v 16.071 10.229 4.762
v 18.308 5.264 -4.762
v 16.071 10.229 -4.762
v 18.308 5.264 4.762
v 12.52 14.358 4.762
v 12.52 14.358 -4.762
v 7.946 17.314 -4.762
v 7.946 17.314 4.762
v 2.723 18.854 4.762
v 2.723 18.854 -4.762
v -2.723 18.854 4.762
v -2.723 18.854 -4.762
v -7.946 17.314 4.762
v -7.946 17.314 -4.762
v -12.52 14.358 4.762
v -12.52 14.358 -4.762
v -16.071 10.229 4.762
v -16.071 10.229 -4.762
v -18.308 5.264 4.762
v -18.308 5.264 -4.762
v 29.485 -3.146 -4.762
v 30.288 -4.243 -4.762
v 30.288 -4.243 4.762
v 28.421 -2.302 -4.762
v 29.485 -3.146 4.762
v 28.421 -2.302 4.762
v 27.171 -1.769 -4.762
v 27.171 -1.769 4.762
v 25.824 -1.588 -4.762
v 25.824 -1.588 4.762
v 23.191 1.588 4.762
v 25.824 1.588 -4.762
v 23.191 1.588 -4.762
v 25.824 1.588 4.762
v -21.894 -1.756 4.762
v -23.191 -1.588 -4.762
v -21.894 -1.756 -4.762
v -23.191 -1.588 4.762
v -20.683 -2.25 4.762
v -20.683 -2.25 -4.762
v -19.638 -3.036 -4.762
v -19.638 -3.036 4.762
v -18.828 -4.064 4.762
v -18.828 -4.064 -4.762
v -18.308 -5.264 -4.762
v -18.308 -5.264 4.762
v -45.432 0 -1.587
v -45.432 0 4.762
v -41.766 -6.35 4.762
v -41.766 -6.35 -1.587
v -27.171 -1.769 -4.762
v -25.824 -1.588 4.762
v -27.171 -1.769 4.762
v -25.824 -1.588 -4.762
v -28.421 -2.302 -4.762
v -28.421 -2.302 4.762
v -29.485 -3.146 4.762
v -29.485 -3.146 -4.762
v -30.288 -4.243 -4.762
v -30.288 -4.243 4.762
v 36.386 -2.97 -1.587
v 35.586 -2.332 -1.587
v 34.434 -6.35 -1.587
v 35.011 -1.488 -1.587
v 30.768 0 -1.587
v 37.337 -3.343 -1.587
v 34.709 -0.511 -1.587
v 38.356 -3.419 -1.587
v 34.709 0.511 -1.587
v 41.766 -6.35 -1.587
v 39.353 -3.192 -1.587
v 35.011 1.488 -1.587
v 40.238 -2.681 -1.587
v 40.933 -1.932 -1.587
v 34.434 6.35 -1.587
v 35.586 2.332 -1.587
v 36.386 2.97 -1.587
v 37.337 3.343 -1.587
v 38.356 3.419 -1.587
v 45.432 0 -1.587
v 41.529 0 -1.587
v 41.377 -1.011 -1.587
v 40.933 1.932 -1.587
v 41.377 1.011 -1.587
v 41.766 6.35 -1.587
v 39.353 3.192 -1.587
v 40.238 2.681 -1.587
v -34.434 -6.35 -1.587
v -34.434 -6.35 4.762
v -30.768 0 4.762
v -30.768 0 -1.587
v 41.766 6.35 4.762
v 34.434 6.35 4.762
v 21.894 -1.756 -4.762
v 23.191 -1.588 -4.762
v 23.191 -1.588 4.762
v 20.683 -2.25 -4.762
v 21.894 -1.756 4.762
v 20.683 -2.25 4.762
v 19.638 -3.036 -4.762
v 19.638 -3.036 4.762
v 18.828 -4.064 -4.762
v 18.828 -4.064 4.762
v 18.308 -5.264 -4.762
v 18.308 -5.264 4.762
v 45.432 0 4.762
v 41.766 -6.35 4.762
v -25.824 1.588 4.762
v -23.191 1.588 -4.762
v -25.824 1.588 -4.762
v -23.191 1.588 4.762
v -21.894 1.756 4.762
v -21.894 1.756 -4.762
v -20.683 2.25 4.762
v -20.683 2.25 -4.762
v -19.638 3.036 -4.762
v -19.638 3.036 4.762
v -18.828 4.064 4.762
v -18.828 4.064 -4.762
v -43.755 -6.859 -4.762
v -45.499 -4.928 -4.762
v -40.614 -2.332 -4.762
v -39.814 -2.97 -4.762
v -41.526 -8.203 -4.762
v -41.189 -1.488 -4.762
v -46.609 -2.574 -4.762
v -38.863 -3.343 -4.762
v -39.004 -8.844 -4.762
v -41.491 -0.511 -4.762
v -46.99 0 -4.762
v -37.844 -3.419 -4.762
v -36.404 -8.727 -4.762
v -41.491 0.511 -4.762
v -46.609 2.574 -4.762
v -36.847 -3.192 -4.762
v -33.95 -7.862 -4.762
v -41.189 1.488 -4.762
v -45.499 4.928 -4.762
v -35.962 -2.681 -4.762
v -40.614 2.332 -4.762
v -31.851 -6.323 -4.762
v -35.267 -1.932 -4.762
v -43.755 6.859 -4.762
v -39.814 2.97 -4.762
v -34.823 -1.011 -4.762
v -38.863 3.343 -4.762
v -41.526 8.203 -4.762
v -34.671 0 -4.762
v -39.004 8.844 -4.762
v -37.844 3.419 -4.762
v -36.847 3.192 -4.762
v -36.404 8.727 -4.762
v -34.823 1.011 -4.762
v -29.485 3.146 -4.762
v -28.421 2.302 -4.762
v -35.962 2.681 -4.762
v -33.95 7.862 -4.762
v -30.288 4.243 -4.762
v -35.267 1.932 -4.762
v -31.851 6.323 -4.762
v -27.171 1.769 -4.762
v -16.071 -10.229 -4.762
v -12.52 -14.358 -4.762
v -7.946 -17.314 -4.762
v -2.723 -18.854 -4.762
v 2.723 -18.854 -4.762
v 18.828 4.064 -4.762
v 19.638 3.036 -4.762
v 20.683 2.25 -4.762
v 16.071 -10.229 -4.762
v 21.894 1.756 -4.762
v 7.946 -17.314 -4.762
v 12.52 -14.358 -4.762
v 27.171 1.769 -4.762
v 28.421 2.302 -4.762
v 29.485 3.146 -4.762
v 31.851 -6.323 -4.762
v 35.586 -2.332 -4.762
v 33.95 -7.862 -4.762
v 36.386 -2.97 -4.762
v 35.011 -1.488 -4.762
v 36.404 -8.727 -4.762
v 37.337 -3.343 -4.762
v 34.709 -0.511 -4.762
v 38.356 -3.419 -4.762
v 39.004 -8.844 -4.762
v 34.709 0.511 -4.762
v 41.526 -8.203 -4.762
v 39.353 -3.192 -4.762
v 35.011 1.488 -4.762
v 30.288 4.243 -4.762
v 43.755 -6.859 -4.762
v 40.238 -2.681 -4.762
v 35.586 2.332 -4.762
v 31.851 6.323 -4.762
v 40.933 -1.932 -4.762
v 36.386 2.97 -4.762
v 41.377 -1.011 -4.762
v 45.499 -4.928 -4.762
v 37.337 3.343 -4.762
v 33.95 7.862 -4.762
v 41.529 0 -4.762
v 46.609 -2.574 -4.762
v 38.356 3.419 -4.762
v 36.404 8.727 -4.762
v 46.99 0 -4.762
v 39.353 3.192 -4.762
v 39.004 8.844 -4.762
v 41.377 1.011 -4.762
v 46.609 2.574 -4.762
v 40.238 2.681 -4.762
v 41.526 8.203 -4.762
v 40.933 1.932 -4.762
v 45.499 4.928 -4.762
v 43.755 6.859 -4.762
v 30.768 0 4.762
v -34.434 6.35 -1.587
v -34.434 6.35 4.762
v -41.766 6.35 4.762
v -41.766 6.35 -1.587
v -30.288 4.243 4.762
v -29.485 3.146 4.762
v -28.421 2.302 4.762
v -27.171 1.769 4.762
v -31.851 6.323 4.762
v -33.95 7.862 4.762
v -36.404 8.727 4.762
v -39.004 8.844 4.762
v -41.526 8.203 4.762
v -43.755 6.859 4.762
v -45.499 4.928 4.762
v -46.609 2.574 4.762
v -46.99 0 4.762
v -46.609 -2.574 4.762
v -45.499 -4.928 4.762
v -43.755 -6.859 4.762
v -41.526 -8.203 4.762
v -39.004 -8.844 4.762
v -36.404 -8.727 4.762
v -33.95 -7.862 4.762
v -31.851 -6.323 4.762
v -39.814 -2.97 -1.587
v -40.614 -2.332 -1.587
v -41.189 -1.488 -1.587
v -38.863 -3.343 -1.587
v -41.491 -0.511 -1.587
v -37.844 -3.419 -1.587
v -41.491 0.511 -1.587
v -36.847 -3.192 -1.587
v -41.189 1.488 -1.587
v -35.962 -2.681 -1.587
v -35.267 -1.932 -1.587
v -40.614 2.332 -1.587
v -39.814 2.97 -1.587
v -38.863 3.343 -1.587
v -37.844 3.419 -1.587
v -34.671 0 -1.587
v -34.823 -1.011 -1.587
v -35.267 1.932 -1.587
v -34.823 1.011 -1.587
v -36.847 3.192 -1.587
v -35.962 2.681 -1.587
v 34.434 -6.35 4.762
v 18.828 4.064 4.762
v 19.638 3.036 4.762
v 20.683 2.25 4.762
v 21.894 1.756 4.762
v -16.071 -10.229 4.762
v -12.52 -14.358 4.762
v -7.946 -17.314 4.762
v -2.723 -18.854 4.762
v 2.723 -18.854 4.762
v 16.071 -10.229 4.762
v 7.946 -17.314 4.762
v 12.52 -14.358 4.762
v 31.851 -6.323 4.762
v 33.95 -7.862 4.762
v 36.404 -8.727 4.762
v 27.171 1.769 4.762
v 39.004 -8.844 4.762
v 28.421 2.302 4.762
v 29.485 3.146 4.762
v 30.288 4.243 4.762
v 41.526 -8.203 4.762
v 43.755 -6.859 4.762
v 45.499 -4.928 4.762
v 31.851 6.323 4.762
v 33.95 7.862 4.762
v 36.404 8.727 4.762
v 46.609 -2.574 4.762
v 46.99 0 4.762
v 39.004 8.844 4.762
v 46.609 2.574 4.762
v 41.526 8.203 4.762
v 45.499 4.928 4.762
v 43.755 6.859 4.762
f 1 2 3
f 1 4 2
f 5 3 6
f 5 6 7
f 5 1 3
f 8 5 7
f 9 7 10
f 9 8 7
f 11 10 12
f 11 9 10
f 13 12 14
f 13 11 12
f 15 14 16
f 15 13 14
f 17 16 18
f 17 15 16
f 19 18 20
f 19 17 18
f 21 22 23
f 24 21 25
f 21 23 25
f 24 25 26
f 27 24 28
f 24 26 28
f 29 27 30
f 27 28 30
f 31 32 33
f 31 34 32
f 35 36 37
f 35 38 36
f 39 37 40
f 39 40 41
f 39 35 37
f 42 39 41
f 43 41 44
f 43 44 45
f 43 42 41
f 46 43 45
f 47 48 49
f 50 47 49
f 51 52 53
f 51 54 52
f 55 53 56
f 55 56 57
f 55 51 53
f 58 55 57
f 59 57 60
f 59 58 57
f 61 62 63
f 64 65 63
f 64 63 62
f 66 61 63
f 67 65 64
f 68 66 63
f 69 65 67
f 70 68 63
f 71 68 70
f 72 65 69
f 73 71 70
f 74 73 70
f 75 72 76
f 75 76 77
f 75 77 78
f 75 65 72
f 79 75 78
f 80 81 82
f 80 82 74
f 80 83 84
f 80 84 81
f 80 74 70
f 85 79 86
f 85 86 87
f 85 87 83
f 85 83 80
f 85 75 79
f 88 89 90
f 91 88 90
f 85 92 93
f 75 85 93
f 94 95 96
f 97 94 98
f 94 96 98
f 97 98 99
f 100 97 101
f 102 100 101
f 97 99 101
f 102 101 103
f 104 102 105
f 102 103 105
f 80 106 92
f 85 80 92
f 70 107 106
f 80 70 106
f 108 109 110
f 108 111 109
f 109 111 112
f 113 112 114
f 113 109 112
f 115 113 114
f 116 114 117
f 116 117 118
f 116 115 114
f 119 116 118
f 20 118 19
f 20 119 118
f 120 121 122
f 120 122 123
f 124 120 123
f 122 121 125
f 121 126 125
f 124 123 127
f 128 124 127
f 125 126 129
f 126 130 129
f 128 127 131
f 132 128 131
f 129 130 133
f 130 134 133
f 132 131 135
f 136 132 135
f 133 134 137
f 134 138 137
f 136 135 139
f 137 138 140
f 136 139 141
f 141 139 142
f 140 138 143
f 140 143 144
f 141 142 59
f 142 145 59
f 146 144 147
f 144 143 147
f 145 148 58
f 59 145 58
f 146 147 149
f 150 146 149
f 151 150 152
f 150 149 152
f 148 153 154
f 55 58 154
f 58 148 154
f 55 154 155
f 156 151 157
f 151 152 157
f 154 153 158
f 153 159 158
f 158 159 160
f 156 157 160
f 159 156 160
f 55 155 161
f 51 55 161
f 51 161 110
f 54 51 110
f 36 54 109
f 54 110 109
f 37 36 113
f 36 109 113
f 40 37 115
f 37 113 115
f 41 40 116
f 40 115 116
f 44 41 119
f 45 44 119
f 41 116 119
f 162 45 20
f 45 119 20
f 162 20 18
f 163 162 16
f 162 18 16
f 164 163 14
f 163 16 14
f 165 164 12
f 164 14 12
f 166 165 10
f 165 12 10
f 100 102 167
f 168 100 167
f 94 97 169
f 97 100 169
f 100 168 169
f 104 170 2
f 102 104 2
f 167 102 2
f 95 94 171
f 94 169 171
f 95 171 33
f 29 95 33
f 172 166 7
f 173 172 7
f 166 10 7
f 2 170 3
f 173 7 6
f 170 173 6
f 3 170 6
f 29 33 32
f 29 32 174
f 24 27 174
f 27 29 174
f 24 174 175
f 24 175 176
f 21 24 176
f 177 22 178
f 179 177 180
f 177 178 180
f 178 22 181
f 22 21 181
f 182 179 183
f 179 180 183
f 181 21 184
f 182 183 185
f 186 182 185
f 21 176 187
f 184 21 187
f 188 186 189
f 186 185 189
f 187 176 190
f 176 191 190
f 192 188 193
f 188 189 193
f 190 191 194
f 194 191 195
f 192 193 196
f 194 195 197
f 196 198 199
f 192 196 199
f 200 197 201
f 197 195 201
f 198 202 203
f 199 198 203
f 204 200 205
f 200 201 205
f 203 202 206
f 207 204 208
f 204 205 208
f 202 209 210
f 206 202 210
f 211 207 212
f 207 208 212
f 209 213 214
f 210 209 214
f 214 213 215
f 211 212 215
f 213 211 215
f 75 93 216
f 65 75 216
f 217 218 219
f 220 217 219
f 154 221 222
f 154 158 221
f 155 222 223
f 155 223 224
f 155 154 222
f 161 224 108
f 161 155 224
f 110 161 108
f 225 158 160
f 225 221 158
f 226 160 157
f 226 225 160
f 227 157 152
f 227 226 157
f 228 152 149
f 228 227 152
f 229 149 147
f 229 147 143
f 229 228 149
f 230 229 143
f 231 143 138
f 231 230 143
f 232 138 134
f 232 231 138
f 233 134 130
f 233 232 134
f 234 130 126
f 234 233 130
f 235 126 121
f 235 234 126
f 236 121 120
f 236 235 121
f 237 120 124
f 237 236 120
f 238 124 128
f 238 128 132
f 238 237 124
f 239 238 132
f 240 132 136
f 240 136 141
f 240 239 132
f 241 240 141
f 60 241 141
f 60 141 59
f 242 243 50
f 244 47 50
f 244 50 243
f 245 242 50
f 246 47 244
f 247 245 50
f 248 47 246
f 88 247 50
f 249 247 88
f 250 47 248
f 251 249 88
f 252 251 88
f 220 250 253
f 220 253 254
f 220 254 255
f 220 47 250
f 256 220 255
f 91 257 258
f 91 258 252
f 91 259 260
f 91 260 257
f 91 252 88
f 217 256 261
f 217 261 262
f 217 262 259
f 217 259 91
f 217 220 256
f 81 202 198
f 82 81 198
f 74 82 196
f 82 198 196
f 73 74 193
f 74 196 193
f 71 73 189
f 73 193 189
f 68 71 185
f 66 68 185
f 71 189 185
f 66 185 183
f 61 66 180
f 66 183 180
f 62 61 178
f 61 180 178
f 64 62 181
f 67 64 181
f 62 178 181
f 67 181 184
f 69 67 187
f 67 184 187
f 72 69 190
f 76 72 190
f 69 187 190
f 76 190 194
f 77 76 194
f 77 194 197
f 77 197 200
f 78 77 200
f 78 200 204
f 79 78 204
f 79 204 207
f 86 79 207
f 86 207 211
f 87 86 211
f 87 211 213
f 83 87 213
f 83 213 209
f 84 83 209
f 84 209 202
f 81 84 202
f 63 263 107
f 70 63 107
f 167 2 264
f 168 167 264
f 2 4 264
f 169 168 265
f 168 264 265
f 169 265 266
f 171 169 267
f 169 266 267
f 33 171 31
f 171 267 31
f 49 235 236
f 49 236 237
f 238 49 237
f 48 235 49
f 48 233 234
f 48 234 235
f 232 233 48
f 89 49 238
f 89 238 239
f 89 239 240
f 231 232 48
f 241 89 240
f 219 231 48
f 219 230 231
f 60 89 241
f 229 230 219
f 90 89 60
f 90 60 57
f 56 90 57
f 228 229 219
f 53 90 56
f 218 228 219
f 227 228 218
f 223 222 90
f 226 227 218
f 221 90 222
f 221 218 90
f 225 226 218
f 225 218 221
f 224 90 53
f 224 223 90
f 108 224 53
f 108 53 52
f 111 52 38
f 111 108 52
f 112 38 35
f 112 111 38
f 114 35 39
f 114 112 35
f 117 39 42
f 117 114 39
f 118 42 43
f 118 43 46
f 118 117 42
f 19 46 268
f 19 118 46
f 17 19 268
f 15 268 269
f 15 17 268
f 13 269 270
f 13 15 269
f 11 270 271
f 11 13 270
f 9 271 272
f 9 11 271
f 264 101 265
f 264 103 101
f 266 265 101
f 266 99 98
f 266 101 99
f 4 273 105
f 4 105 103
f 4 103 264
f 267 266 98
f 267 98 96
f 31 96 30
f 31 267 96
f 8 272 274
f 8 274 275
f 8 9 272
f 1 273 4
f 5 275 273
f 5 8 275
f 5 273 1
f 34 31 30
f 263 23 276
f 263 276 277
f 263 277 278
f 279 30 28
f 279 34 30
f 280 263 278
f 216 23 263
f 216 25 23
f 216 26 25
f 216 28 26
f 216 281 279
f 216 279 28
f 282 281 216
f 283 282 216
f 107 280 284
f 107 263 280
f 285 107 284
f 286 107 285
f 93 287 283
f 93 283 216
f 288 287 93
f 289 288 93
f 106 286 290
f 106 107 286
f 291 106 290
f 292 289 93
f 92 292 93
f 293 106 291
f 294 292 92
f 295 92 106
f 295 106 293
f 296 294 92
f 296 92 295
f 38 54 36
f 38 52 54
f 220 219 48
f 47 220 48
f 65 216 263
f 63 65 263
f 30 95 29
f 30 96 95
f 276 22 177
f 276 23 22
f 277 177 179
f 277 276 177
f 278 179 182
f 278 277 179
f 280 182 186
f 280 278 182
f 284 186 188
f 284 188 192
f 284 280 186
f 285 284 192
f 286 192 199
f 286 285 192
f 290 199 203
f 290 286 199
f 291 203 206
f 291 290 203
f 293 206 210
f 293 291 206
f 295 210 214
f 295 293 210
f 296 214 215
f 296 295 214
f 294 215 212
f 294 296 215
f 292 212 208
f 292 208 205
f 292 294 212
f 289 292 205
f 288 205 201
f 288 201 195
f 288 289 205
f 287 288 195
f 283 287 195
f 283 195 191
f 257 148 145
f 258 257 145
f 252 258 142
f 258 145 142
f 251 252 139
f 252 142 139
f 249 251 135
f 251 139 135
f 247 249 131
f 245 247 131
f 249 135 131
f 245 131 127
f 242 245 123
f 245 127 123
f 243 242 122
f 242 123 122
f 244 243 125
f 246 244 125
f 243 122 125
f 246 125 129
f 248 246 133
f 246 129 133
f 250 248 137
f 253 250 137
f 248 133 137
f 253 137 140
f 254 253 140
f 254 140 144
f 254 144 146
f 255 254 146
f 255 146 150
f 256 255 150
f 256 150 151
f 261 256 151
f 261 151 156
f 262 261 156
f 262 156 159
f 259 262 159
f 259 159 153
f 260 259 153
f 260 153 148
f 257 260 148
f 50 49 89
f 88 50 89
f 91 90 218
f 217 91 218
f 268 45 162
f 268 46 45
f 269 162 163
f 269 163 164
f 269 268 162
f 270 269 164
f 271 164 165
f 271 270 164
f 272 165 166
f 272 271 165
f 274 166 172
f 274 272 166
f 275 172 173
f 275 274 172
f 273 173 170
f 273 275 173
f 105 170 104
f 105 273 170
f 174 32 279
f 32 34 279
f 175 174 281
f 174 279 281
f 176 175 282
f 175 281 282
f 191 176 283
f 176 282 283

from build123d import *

# Parameters (mm, degrees)
F1_DEPTH = 4.7625
F2_R     = 5.08
F4_DEPTH = 6.35
F5_R     = 3.429
F6_DEPTH = 9.526


with BuildPart() as f1:
    # F0 (on Top) → F1 (new body, symmetric)
    with BuildSketch(Plane.XY):
        with BuildLine():
            Line((-29.352889, -1.5875), (-18.983739, -1.5875))
            ThreePointArc((-18.983739, -1.5875), (0, -19.05), (18.983739, -1.5875))
            Line((18.983739, -1.5875), (29.352889, -1.5875))
            ThreePointArc((29.352889, -1.5875), (46.99, 0), (29.352889, 1.5875))
            Line((29.352889, 1.5875), (18.983739, 1.5875))
            ThreePointArc((18.983739, 1.5875), (0, 19.05), (-18.983739, 1.5875))
            Line((-18.983739, 1.5875), (-29.352889, 1.5875))
            ThreePointArc((-29.352889, 1.5875), (-46.99, 0), (-29.352889, -1.5875))
        make_face()
    extrude(amount=F1_DEPTH, both=True)

    # F2
    f2_edges = [f1.edges().sort_by_distance(p)[0] for p in [
        (-29.352889, 1.5875, 0),
        (18.983739, 1.5875, 0),
        (-18.983739, 1.5875, 0),
        (29.352889, 1.5875, 0),
        (29.352889, -1.5875, 0),
        (-18.983739, -1.5875, 0),
        (-29.352889, -1.5875, 0),
        (18.983739, -1.5875, 0),
    ]]
    fillet(f2_edges, radius=F2_R)

    # F3 (on face) → F4 (cut)
    with BuildSketch(Plane.XY.offset(4.7625)):
        Polygon((-30.767652, 0), (-34.433826, 6.35), (-41.766174, 6.35), (-45.432348, 0), (-41.766174, -6.35), (-34.433826, -6.35), align=None)
        Polygon((41.766174, -6.35), (45.432348, 0), (41.766174, 6.35), (34.433826, 6.35), (30.767652, 0), (34.433826, -6.35), align=None)
    extrude(amount=-F4_DEPTH, mode=Mode.SUBTRACT)

    # F5 (on face) → F6 (cut, through all)
    with BuildSketch(Plane(origin=(0, 0, -4.7625), x_dir=(1, 0, 0), z_dir=(0, 0, -1))):
        with Locations((-38.1, 0)):
            Circle(F5_R)
        with Locations((38.1, 0)):
            Circle(F5_R)
    extrude(amount=-F6_DEPTH, mode=Mode.SUBTRACT)


solid = f1.part
